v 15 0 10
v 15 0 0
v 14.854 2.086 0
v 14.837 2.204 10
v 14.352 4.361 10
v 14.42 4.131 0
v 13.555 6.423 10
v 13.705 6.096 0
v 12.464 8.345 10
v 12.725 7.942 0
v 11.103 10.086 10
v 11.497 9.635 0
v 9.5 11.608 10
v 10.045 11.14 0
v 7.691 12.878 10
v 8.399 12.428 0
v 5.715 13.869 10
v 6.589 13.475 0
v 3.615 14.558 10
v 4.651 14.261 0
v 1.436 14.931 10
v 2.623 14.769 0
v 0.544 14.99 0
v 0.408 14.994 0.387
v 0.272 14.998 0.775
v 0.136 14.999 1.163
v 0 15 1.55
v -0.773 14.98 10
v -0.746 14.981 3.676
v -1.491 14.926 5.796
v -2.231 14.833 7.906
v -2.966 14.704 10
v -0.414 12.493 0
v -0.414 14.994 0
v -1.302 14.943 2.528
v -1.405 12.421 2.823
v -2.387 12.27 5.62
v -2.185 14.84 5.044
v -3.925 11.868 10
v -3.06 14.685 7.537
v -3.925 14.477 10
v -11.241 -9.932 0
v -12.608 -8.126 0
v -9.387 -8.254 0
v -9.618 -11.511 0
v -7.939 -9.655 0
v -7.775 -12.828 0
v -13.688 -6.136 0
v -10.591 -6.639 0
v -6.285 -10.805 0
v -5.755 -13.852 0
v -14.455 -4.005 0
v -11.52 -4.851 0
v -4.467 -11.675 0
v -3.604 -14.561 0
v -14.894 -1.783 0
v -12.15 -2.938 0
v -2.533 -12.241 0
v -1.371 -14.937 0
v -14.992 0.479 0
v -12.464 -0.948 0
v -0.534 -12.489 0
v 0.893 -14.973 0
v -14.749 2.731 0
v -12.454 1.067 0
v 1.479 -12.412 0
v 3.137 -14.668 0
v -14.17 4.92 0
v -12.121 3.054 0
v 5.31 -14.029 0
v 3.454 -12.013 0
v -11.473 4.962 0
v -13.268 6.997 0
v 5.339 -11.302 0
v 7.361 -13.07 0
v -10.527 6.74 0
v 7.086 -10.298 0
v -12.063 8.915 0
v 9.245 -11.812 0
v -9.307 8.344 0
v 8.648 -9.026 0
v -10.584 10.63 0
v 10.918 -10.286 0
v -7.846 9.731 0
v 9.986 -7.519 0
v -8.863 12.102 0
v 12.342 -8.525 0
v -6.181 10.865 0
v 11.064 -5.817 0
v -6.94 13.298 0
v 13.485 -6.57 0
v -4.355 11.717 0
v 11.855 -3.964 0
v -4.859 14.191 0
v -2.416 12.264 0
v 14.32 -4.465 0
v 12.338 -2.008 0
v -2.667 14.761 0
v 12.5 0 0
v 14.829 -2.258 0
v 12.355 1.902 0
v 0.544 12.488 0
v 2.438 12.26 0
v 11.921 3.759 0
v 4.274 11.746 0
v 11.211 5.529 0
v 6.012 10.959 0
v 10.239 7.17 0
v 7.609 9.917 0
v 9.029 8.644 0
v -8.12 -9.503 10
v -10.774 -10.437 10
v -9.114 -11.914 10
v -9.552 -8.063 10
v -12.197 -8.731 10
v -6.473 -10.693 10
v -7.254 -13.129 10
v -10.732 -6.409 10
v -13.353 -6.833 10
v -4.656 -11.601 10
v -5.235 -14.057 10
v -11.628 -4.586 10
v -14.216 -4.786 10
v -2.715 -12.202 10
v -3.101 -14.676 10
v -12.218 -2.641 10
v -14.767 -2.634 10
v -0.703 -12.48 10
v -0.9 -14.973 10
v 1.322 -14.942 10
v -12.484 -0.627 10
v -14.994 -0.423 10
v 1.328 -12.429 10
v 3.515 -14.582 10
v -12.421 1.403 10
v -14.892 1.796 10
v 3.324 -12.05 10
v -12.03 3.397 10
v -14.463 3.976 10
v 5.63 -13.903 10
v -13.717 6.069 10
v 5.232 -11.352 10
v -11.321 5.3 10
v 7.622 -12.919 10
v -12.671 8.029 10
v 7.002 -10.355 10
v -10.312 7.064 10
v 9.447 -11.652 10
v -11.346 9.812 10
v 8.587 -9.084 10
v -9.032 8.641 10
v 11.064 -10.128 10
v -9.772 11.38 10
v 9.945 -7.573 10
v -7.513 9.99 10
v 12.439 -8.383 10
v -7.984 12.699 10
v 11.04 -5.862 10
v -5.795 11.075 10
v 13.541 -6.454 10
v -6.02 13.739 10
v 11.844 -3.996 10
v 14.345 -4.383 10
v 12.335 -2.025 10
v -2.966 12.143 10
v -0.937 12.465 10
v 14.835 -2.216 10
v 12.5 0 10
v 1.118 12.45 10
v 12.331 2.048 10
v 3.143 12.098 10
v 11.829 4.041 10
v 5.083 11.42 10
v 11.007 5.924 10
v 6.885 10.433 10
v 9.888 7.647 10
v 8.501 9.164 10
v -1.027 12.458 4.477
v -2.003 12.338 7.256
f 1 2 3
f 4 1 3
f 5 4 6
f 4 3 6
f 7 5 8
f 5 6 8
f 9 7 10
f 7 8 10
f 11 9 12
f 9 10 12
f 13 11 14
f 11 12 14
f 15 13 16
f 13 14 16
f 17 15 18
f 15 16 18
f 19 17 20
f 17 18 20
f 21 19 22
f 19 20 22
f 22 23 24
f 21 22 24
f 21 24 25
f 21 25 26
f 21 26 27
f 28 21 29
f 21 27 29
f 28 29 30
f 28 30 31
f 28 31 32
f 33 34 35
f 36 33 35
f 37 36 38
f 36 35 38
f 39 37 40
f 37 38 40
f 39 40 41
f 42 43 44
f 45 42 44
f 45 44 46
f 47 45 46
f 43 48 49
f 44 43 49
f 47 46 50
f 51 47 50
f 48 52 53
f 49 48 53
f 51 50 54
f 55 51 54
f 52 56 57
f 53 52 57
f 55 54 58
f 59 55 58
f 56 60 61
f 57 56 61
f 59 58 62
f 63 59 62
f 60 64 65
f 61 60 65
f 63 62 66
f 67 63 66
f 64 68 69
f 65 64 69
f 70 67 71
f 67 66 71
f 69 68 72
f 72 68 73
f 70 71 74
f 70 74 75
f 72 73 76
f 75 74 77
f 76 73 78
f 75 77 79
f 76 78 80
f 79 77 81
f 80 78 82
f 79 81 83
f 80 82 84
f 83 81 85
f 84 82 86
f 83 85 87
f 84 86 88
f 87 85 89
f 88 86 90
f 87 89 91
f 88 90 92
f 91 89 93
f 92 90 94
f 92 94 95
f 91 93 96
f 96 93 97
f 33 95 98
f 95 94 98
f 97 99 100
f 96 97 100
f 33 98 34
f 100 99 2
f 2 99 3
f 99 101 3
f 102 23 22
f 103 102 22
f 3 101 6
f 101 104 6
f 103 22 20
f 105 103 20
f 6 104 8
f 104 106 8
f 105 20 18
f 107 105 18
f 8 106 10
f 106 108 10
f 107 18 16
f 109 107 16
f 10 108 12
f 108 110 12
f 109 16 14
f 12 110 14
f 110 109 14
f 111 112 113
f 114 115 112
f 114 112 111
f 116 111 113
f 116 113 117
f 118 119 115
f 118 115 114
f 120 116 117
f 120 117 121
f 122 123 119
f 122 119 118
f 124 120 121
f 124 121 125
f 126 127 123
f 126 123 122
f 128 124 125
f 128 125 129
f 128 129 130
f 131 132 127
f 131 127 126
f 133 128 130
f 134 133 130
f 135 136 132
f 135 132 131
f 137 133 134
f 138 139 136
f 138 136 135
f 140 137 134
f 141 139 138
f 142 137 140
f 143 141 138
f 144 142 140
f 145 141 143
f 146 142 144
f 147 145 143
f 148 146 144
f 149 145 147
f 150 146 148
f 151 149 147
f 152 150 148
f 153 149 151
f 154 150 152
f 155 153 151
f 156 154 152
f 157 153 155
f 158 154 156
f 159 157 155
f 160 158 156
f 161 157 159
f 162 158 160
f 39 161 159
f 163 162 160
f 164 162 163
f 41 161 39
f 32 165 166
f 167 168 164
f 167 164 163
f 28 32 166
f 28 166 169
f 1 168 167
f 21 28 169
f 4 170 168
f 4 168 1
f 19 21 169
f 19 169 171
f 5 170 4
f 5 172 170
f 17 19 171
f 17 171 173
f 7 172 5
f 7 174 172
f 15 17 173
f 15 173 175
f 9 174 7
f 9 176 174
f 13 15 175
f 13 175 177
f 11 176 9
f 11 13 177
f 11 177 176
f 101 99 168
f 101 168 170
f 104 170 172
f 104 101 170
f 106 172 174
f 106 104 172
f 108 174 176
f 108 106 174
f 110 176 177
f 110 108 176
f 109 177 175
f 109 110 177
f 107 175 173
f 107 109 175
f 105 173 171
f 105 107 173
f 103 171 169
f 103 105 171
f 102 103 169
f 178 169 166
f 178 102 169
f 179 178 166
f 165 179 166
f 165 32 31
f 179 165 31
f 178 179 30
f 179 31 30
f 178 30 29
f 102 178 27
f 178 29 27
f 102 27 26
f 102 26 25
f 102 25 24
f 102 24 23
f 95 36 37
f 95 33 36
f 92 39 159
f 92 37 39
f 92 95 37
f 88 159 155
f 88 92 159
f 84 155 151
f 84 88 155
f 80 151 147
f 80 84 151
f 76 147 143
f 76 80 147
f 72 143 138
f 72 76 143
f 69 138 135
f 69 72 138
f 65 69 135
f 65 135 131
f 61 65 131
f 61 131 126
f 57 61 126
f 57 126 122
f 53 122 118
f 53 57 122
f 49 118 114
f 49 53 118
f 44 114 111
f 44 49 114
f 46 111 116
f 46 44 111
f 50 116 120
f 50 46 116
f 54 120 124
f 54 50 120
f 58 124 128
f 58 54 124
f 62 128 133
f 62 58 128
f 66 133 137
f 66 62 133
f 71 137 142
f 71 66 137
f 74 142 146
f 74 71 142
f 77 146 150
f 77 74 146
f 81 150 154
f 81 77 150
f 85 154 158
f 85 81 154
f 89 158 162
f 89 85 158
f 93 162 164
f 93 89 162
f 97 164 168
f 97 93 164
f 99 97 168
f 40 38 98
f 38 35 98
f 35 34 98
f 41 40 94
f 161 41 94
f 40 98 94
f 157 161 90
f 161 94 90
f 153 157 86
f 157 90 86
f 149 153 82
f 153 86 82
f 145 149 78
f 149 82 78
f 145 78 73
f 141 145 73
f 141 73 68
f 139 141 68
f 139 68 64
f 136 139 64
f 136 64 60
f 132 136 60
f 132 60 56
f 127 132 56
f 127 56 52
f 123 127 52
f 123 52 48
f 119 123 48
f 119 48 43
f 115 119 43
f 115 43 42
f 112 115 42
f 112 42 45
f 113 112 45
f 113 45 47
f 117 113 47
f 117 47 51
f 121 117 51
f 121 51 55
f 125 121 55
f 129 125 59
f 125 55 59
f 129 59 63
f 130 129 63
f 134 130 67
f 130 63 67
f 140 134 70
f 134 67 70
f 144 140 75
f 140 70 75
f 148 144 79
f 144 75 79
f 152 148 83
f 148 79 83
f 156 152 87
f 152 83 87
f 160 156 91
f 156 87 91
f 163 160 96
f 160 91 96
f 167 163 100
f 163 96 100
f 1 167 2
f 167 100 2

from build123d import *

# Parameters (mm, degrees)
SKETCH1_R           = 15
SKETCH1_R_2         = 12.5
BOSS_EXTRUDE1_DEPTH = 10
CUT_EXTRUDE1_DEPTH  = 10


with BuildPart() as part:
    # Sketch1 → Boss-Extrude1 (new body)
    with BuildSketch(Plane.XY):
        Circle(SKETCH1_R)
        Circle(SKETCH1_R_2, mode=Mode.SUBTRACT)
    extrude(amount=BOSS_EXTRUDE1_DEPTH)

    # Sketch2 → Cut-Extrude1 (cut)
    with BuildSketch(Plane(origin=(0, 15, 0), x_dir=(1, 0, 0), z_dir=(0, 1, 0))):
        Polygon((0.693116527, 3.154438347), (-4.706995906, -12.228203461), (-3.793236096, -12.355616729), (1.606876337, 3.02702508), align=None)
    extrude(amount=-CUT_EXTRUDE1_DEPTH, mode=Mode.SUBTRACT)


solid = part.part
